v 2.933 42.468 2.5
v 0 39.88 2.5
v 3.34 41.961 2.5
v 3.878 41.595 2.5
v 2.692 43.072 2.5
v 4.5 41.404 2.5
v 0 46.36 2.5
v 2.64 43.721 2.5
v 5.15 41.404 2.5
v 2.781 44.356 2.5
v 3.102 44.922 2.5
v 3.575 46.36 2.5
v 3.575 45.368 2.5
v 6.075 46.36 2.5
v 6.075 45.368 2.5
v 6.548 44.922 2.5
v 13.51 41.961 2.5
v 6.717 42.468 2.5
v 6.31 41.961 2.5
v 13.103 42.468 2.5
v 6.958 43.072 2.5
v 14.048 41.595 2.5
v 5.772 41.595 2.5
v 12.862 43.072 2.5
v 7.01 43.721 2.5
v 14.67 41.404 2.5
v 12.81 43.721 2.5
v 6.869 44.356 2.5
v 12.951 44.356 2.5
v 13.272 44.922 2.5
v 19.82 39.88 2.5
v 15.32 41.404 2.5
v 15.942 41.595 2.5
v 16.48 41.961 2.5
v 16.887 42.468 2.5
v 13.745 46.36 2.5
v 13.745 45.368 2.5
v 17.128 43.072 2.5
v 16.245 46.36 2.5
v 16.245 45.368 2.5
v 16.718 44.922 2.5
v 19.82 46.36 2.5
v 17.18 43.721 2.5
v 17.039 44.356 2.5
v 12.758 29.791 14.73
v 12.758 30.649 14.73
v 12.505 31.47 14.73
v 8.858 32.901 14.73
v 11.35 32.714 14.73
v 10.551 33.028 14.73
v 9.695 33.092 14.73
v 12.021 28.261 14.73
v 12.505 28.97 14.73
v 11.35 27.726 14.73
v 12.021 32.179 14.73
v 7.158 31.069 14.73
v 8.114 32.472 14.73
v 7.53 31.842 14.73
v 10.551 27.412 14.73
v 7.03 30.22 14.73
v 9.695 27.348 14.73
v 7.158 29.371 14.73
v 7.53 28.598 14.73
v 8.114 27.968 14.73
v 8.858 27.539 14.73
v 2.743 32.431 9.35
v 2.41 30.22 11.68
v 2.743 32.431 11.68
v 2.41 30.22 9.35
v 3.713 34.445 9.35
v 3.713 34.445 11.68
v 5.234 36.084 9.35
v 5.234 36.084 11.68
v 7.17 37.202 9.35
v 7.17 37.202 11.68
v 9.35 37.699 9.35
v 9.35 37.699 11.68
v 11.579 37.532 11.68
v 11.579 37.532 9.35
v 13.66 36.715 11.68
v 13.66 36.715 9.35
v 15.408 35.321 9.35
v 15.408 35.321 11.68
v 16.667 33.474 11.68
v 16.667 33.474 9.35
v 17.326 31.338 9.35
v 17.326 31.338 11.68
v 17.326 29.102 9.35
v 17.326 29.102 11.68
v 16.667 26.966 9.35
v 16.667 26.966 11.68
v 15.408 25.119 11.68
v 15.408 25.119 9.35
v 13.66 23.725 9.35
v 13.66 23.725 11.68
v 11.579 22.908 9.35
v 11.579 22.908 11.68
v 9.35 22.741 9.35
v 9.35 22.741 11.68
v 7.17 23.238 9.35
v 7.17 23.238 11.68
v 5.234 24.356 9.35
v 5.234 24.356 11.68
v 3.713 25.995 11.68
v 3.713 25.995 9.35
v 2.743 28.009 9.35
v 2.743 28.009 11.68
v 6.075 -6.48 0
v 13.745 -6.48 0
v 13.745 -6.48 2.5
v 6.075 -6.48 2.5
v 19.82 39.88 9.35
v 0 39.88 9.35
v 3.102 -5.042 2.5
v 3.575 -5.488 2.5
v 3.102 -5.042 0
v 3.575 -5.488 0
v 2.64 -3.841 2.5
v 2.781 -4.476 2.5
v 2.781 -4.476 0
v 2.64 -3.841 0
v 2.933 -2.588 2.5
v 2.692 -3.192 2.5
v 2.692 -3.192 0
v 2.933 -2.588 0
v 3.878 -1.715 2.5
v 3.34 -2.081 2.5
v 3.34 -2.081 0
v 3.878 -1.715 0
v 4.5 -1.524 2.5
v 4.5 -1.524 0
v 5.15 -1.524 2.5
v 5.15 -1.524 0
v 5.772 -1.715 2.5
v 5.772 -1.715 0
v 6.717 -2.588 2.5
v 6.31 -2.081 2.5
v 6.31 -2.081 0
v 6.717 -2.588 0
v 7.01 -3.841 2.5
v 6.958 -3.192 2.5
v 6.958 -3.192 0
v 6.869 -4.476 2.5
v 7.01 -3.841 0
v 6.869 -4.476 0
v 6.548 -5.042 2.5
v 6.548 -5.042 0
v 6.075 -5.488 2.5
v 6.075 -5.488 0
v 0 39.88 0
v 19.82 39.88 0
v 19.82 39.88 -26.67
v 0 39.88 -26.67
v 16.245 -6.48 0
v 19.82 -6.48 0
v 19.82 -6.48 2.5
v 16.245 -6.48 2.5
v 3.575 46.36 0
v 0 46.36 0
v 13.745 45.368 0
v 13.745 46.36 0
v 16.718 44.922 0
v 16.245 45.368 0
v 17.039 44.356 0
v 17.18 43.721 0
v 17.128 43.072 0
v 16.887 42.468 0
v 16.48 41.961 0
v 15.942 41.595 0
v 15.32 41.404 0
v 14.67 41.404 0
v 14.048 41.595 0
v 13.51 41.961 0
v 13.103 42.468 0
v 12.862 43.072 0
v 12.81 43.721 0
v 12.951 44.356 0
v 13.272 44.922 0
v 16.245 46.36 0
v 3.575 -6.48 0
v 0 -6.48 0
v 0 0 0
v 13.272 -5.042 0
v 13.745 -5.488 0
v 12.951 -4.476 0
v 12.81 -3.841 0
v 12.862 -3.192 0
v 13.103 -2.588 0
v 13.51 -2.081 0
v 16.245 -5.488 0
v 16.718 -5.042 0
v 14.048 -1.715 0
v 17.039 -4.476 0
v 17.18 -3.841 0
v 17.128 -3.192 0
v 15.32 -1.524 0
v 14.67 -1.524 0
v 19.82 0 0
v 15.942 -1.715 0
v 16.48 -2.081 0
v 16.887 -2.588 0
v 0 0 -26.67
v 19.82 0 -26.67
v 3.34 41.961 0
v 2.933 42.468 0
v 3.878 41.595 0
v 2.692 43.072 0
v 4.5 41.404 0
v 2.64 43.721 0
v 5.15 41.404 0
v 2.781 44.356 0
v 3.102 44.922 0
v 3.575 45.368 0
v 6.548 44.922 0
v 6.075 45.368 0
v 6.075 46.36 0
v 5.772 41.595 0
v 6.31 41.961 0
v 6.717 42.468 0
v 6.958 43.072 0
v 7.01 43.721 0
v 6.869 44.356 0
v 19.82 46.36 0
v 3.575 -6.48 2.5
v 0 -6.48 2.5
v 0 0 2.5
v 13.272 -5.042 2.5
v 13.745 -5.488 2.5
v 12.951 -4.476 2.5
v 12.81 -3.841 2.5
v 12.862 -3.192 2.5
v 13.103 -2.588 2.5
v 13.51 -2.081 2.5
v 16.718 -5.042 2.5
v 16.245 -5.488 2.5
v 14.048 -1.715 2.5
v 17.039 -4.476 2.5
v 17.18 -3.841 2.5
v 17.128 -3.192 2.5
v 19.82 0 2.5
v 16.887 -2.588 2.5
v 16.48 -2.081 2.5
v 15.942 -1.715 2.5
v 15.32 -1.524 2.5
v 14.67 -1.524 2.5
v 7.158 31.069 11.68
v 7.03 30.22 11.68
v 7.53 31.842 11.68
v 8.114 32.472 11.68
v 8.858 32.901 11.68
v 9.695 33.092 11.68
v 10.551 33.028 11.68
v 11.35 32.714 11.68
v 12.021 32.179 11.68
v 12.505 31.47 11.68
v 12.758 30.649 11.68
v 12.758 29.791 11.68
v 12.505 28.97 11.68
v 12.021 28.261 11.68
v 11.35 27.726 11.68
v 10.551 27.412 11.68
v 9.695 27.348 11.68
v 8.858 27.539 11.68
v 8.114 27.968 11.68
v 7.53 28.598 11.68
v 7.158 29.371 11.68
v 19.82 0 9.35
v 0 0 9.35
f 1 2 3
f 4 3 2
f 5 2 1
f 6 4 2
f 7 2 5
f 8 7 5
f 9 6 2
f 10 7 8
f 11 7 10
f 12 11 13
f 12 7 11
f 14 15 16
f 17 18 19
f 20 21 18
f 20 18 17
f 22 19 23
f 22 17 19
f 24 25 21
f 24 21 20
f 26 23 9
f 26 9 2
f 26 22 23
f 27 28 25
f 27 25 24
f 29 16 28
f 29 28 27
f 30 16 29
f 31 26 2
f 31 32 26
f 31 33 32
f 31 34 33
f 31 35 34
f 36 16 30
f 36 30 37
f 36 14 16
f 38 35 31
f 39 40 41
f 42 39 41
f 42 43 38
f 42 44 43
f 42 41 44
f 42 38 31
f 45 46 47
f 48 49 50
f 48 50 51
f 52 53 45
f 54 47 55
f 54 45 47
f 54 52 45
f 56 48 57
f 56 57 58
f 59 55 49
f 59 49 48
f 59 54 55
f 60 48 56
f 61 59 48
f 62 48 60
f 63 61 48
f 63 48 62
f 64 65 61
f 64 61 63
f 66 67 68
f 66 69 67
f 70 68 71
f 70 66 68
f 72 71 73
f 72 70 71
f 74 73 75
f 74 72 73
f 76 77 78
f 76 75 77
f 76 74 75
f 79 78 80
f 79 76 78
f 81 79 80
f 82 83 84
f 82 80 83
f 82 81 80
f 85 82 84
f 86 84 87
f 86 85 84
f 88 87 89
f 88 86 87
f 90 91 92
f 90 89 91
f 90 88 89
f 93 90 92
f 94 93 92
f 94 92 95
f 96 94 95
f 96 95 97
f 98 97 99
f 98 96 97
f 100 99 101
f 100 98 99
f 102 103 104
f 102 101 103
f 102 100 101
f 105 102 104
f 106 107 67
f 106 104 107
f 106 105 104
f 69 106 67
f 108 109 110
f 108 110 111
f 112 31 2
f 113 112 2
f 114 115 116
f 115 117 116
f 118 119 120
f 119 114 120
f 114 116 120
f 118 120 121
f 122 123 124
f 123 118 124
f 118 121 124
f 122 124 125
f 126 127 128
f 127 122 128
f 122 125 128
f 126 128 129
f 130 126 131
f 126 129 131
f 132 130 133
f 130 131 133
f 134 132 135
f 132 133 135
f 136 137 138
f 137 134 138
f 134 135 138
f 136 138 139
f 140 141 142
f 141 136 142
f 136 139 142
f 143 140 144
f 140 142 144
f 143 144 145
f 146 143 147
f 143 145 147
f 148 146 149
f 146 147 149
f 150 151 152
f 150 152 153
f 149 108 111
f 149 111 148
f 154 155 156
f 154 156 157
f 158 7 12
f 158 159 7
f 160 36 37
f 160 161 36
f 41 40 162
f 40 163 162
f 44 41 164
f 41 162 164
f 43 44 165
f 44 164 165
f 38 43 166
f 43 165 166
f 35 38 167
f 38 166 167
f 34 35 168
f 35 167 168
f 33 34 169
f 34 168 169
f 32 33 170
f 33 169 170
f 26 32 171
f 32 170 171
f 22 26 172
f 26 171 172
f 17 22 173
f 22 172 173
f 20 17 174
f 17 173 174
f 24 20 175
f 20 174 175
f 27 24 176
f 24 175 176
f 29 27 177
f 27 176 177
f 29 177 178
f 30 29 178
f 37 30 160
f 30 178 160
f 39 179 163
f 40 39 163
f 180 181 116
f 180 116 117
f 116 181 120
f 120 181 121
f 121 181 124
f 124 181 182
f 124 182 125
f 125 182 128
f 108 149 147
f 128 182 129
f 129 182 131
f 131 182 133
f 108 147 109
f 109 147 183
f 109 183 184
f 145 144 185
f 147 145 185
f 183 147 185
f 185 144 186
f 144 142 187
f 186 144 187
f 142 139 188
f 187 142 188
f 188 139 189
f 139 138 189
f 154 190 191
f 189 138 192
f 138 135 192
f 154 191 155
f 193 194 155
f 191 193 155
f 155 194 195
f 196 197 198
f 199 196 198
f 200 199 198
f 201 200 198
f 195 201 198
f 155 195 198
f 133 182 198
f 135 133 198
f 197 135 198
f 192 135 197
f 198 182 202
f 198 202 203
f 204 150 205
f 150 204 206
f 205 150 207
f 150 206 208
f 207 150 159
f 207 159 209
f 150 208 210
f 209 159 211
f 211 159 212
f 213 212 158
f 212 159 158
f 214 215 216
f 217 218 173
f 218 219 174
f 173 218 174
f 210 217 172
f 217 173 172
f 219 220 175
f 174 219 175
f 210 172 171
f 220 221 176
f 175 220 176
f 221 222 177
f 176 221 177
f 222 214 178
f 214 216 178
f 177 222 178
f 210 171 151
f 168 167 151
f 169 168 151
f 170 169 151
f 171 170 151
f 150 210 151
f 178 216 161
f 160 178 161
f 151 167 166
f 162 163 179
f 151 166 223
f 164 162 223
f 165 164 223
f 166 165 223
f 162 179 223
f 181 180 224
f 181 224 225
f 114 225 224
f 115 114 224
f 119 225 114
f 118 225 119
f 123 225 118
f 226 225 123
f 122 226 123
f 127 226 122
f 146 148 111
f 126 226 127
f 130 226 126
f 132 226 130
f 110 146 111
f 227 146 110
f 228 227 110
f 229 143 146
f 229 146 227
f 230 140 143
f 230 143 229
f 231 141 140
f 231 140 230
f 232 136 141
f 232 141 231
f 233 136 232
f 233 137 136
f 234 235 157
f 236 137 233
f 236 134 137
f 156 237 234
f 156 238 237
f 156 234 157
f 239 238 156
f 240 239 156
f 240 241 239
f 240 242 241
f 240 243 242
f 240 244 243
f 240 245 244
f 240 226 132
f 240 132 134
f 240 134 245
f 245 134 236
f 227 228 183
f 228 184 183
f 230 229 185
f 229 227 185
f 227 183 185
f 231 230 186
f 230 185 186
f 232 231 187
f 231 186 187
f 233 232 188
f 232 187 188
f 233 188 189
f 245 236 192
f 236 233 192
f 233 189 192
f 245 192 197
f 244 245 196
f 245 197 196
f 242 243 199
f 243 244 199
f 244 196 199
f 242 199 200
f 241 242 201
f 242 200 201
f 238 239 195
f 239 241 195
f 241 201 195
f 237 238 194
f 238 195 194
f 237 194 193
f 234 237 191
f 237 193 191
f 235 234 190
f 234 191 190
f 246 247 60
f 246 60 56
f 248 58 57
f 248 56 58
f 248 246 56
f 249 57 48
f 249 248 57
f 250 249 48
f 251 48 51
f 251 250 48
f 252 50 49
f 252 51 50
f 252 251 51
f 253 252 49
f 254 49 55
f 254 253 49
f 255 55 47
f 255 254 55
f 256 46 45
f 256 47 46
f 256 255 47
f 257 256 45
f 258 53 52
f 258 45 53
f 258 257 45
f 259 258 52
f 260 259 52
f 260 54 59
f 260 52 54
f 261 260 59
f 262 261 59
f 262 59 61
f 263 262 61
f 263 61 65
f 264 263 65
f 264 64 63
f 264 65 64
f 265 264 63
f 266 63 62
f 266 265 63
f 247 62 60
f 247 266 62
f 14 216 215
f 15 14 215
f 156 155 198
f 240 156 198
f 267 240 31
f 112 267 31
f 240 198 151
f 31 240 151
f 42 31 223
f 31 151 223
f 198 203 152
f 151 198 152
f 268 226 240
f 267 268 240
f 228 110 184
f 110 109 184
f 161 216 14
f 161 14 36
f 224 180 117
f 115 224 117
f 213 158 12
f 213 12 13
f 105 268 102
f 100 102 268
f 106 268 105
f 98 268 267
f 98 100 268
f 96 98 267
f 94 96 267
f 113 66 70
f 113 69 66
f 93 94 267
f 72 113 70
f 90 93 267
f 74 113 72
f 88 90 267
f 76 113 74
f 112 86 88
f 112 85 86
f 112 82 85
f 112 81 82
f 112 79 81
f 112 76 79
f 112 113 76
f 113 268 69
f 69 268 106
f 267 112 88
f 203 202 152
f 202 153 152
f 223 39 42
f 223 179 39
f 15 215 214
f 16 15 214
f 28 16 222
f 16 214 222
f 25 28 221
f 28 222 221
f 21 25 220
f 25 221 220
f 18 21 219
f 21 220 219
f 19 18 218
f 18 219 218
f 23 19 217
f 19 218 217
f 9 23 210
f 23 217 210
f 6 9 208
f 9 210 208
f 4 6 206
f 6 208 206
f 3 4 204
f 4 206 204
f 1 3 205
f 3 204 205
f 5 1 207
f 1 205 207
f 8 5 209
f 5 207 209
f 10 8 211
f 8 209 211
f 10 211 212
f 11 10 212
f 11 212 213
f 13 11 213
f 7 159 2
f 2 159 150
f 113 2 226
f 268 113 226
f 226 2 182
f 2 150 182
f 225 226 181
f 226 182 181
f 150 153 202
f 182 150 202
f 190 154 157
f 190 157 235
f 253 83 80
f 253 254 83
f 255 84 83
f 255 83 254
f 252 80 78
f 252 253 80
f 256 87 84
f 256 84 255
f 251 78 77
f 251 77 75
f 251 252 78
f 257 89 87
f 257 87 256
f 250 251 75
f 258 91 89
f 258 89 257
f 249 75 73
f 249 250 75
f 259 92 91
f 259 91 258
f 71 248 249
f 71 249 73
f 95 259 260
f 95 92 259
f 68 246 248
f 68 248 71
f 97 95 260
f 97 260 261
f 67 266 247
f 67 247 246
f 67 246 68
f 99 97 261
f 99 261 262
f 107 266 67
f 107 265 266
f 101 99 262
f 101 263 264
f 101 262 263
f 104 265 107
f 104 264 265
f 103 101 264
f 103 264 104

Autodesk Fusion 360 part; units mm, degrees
sketch "Sketch1" plane through (0, 0, 0) normal (0, 0, 1) x (1, 0, 0)
  line L0 (0, 0) -> (19.82, 0)
  line L1 (19.82, 0) -> (19.82, 39.88)
  line L2 (19.82, 39.88) -> (0, 39.88)
  line L3 (0, 39.88) -> (0, 0)
  line L4 (0, 46.36) -> (19.82, 46.36)
  line L5 (19.82, 46.36) -> (19.82, -6.48)
  line L6 (19.82, -6.48) -> (0, -6.48)
  line L7 (0, -6.48) -> (0, 46.36)
  line L8 (9.91, 39.88) -> (9.91, 0) construction
  line L9 (19.82, 19.94) -> (0, 19.94) construction
  circle A0 centre (4.825, 43.57) radius 2.19
  circle A1 centre (14.995, 43.57) radius 2.19
  circle A2 centre (4.825, -3.69) radius 2.19
  circle A3 centre (14.995, -3.69) radius 2.19
  line L10 (3.575, 46.36) -> (3.575, 45.3682)
  line L11 (6.075, 46.36) -> (6.075, 45.3682)
  line L12 (13.745, 46.36) -> (13.745, 45.3682)
  line L13 (16.245, 46.36) -> (16.245, 45.3682)
  line L14 (3.575, -6.48) -> (3.575, -5.4882)
  line L15 (6.075, -6.48) -> (6.075, -5.4882)
  line L16 (13.745, -6.48) -> (13.745, -5.4882)
  line L17 (16.245, -6.48) -> (16.245, -5.4882)
  point P0 (4.825, 43.57)
  point P1 (14.995, 43.57)
  point P2 (4.825, -3.69)
  point P3 (14.995, -3.69)
  dimension "d1" = 19.82
  dimension "d2" = 39.88
  dimension "d3" = 52.84
  dimension "d4" = 47.26
  dimension "d5" = 10.17
  dimension "d15" = 4.38
  dimension "d16" = 2.5
  dimension "d17" = 2.5
extrude "Extrude1" add sketch "Sketch1" along normal blind 9.35 and the other way blind 26.67 contours L0 L1 L2 L3 L5 L7
extrude "Extrude2" add sketch "Sketch1" along normal blind 2.5 contours L0 L5 L6 L7 A2 A3 L14 L15 L16 L17 | L2 L4 L5 L7 A0 A1 L10 L11 L12 L13
sketch "Sketch3" plane through (0, 0, 9.35) normal (0, 0, 1) x (-1, 0, 0)
  line L0 (-19.82, -39.88) -> (0, -39.88)
  line L1 (0, -39.88) -> (0, 0)
  line L2 (0, 0) -> (-19.82, 0)
  line L3 (-19.82, 0) -> (-19.82, -39.88)
  circle A0 centre (-9.91, -30.22) radius 7.5
  circle A1 centre (-9.91, -30.22) radius 2.88
  line L4 (-9.91, -39.88) -> (-9.91, -30.22) construction
  dimension "d19" = 9.66
  dimension "d20" = 15
  dimension "d21" = 5.76
extrude "Extrude3" add sketch "Sketch3" along normal blind 2.33 contours A0
extrude "Extrude4" add sketch "Sketch3" along normal blind 5.38 contours A1
equation "d4 = 13.47 mm + 33.79 mm"
equation "d21 = ( 2.88 * 2 ) * 1 mm"
equation "d22 = 11.68 mm - 9.35 mm"
equation "d24 = 11.68 mm - 9.35 mm + 3.05 mm"
